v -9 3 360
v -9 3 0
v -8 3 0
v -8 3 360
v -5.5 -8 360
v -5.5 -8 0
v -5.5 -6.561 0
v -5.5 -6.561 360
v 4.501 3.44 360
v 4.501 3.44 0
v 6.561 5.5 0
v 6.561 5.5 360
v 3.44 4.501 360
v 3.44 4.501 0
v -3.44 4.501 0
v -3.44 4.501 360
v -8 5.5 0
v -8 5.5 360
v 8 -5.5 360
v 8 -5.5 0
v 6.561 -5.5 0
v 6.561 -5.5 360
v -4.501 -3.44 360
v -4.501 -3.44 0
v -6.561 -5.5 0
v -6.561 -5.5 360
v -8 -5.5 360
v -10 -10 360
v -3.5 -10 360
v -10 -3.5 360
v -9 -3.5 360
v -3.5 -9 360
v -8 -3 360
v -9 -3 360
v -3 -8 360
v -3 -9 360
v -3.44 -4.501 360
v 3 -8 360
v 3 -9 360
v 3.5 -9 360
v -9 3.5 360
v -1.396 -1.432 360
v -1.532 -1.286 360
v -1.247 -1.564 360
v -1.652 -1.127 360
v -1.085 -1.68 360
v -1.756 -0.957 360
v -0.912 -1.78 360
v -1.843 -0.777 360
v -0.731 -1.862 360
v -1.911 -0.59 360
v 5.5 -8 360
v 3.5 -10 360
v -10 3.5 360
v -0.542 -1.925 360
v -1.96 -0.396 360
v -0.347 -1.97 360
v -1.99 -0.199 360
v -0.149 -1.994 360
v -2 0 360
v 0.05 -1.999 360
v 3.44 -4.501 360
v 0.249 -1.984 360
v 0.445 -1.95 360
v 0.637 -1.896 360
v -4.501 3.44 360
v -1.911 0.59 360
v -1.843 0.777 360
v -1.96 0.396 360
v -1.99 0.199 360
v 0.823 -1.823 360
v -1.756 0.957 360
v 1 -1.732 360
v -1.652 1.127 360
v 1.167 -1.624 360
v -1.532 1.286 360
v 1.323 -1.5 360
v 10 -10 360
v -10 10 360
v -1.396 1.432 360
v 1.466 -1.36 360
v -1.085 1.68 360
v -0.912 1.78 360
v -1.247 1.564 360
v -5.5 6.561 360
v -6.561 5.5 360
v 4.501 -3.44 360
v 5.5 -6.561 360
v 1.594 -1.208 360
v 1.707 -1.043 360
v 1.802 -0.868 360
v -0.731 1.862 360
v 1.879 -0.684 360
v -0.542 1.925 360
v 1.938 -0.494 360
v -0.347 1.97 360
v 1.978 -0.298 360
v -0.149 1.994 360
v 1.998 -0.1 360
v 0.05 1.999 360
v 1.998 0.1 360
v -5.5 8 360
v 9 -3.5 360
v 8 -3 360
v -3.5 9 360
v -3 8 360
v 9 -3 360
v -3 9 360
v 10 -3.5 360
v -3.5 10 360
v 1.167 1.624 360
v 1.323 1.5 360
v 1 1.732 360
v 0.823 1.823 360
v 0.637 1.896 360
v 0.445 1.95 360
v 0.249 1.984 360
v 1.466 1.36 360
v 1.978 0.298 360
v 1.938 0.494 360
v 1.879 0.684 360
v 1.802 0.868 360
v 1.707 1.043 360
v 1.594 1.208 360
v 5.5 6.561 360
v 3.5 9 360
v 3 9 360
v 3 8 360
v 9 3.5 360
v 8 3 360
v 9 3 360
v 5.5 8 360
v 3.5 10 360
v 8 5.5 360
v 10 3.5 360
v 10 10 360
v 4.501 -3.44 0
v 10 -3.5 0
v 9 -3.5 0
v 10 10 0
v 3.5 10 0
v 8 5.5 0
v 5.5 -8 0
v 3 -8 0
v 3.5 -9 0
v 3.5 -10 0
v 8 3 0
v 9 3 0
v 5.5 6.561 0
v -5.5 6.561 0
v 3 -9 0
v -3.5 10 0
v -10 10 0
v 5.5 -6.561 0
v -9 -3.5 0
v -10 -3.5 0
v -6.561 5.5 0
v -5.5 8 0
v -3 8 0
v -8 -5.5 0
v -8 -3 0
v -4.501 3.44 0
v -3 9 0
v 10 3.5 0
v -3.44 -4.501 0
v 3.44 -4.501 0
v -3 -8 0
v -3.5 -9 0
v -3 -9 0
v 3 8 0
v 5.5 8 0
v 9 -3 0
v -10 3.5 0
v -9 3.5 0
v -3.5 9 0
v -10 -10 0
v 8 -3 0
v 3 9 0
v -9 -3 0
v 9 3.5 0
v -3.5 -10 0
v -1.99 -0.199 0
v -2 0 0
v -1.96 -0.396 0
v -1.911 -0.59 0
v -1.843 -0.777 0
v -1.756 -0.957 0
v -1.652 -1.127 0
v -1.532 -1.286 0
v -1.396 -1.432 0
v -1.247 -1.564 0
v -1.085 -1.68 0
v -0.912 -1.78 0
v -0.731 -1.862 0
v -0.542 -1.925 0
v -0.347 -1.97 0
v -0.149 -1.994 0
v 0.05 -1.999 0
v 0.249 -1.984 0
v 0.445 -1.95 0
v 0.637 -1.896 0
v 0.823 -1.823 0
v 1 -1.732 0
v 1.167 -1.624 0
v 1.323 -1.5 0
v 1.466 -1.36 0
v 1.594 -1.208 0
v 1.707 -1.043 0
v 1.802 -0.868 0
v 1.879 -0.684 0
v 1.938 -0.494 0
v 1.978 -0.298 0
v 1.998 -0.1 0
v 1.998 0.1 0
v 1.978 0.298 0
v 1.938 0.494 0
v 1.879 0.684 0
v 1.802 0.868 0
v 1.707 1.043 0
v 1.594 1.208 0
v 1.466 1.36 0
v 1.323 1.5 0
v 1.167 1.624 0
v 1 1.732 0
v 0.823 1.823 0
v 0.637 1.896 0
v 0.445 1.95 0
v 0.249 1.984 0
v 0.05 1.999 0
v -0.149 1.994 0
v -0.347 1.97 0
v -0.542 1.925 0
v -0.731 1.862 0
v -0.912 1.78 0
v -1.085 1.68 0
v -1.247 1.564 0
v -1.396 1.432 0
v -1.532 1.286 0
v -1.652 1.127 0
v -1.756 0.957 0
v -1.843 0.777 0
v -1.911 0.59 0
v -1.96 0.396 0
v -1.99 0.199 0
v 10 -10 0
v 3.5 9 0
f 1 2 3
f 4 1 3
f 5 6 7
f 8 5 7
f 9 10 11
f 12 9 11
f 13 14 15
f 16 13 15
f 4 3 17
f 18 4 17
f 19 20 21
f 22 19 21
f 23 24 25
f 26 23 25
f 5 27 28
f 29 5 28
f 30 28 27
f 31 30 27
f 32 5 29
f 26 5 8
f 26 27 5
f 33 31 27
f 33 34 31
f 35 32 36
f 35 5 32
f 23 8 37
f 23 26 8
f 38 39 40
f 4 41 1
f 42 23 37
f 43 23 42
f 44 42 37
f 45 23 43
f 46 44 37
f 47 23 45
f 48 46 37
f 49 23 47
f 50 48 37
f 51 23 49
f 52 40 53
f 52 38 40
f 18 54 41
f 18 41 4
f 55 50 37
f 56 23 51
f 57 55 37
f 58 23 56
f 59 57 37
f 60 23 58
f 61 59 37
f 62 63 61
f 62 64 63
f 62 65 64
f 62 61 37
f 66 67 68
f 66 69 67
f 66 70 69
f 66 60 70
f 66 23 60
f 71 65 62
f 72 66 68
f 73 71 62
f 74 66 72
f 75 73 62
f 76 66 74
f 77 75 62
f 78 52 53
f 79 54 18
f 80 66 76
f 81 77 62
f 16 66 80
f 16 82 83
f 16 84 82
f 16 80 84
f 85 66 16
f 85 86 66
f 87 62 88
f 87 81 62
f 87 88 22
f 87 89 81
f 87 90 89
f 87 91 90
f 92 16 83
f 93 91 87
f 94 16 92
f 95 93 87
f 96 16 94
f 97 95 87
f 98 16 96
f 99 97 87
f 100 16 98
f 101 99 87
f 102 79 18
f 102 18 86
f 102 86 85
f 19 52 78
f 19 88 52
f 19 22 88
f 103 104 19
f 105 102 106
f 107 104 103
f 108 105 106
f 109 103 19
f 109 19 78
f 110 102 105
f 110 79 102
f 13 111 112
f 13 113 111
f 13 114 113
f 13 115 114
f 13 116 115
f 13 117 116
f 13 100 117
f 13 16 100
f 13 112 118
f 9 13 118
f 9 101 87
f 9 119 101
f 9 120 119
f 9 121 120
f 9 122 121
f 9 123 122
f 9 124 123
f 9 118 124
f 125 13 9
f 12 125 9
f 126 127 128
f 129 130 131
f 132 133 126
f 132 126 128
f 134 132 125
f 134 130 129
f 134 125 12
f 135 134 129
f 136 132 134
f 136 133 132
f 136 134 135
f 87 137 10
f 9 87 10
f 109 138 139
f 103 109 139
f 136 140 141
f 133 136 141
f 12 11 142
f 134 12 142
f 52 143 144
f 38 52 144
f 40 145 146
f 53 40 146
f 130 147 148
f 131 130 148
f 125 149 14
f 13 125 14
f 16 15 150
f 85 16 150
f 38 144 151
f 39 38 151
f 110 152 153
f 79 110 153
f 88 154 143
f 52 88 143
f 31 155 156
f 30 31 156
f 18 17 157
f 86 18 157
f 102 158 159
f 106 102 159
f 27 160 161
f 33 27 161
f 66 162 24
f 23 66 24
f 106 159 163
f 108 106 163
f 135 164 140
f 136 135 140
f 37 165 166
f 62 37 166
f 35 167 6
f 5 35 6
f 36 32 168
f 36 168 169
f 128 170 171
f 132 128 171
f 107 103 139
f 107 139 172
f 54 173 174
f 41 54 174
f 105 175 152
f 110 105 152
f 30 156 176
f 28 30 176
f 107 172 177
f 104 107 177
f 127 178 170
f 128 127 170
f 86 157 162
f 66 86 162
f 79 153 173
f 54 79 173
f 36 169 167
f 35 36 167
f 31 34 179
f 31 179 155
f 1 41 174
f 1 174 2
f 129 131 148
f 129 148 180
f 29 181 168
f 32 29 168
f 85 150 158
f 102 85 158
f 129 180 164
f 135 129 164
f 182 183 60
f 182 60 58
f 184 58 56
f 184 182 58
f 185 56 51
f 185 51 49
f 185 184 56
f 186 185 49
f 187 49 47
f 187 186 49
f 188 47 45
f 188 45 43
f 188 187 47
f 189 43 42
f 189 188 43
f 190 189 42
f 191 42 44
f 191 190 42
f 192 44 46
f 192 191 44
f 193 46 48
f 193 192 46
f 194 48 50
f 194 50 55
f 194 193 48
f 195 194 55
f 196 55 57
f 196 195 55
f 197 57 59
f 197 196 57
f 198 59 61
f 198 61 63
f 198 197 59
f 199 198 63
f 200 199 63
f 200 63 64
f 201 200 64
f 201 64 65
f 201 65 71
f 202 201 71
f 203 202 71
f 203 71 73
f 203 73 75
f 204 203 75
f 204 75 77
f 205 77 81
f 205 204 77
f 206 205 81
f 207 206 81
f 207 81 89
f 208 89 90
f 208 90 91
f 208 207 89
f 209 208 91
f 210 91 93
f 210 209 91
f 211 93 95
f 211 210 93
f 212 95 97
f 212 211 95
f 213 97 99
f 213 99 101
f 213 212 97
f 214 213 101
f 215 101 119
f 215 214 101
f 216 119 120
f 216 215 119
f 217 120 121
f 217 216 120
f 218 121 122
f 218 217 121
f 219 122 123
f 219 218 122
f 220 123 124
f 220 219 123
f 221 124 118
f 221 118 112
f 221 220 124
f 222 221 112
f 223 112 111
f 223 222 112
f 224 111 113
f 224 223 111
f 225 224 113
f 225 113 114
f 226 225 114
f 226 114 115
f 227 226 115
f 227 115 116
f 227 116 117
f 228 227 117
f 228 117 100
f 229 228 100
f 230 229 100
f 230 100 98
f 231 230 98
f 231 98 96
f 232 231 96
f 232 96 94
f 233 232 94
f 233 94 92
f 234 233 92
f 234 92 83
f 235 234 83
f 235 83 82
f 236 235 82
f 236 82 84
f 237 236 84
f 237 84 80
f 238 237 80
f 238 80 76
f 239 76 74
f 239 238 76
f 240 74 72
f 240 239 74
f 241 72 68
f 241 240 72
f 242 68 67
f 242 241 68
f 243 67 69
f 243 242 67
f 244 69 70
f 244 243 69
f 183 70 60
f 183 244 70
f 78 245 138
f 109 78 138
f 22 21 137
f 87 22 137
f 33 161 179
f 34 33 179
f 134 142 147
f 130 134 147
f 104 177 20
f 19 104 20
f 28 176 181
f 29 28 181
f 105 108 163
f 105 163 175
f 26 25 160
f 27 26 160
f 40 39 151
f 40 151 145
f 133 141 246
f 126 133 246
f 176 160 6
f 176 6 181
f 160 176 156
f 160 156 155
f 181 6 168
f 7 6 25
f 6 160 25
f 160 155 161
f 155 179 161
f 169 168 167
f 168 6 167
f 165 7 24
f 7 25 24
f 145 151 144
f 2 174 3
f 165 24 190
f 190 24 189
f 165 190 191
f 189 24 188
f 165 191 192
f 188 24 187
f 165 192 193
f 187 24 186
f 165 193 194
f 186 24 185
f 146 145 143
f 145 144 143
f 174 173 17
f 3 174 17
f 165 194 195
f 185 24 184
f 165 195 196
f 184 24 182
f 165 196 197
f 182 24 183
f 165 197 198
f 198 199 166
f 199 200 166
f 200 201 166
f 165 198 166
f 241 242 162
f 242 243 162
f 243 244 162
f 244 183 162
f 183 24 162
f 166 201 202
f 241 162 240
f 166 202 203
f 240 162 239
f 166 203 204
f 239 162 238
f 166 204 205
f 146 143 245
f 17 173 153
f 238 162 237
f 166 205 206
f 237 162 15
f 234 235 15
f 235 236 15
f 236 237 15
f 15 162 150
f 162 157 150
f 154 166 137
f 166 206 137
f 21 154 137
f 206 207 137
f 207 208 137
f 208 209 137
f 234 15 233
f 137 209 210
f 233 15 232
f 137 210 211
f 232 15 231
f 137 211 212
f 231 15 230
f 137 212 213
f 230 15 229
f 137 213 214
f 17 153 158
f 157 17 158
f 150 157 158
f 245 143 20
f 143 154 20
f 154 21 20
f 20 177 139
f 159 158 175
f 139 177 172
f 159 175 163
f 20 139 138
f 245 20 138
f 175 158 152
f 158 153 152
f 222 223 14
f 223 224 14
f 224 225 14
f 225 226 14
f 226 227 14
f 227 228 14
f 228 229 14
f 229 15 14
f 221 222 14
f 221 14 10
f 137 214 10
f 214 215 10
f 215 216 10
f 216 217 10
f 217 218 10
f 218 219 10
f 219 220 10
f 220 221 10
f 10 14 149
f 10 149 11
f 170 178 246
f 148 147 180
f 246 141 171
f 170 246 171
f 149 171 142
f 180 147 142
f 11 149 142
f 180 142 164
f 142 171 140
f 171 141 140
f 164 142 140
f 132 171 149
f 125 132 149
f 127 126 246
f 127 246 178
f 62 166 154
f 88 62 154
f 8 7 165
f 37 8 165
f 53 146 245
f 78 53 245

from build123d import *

# Parameters (mm, degrees)
SKETCH1_R           = 2
BOSS_EXTRUDE1_DEPTH = 360


with BuildPart() as part:
    # Sketch1 → Boss-Extrude1 (new body)
    with BuildSketch(Plane.XY):
        Polygon((-10, -10), (-3.5, -10), (-3.5, -9), (-3, -9), (-3, -8), (-5.5, -8), (-5.5, -6.560660172), (-3.44, -4.500660172), (3.44, -4.500660172), (5.5, -6.560660172), (5.5, -8), (3, -8), (3, -9), (3.5, -9), (3.5, -10), (10, -10), (10, -3.5), (9, -3.5), (9, -3), (8, -3), (8, -5.5), (6.560660172, -5.5), (4.500660172, -3.44), (4.500660172, 3.44), (6.560660172, 5.5), (8, 5.5), (8, 3), (9, 3), (9, 3.5), (10, 3.5), (10, 10), (3.5, 10), (3.5, 9), (3, 9), (3, 8), (5.5, 8), (5.5, 6.560660172), (3.44, 4.500660172), (-3.44, 4.500660172), (-5.5, 6.560660172), (-5.5, 8), (-3, 8), (-3, 9), (-3.5, 9), (-3.5, 10), (-10, 10), (-10, 3.5), (-9, 3.5), (-9, 3), (-8, 3), (-8, 5.5), (-6.560660172, 5.5), (-4.500660172, 3.44), (-4.500660172, -3.44), (-6.560660172, -5.5), (-8, -5.5), (-8, -3), (-9, -3), (-9, -3.5), (-10, -3.5), align=None)
        with Locations(Location((0, 0, 0), (0, 0, 180))):
            Circle(SKETCH1_R, mode=Mode.SUBTRACT)
    extrude(amount=BOSS_EXTRUDE1_DEPTH)


solid = part.part
